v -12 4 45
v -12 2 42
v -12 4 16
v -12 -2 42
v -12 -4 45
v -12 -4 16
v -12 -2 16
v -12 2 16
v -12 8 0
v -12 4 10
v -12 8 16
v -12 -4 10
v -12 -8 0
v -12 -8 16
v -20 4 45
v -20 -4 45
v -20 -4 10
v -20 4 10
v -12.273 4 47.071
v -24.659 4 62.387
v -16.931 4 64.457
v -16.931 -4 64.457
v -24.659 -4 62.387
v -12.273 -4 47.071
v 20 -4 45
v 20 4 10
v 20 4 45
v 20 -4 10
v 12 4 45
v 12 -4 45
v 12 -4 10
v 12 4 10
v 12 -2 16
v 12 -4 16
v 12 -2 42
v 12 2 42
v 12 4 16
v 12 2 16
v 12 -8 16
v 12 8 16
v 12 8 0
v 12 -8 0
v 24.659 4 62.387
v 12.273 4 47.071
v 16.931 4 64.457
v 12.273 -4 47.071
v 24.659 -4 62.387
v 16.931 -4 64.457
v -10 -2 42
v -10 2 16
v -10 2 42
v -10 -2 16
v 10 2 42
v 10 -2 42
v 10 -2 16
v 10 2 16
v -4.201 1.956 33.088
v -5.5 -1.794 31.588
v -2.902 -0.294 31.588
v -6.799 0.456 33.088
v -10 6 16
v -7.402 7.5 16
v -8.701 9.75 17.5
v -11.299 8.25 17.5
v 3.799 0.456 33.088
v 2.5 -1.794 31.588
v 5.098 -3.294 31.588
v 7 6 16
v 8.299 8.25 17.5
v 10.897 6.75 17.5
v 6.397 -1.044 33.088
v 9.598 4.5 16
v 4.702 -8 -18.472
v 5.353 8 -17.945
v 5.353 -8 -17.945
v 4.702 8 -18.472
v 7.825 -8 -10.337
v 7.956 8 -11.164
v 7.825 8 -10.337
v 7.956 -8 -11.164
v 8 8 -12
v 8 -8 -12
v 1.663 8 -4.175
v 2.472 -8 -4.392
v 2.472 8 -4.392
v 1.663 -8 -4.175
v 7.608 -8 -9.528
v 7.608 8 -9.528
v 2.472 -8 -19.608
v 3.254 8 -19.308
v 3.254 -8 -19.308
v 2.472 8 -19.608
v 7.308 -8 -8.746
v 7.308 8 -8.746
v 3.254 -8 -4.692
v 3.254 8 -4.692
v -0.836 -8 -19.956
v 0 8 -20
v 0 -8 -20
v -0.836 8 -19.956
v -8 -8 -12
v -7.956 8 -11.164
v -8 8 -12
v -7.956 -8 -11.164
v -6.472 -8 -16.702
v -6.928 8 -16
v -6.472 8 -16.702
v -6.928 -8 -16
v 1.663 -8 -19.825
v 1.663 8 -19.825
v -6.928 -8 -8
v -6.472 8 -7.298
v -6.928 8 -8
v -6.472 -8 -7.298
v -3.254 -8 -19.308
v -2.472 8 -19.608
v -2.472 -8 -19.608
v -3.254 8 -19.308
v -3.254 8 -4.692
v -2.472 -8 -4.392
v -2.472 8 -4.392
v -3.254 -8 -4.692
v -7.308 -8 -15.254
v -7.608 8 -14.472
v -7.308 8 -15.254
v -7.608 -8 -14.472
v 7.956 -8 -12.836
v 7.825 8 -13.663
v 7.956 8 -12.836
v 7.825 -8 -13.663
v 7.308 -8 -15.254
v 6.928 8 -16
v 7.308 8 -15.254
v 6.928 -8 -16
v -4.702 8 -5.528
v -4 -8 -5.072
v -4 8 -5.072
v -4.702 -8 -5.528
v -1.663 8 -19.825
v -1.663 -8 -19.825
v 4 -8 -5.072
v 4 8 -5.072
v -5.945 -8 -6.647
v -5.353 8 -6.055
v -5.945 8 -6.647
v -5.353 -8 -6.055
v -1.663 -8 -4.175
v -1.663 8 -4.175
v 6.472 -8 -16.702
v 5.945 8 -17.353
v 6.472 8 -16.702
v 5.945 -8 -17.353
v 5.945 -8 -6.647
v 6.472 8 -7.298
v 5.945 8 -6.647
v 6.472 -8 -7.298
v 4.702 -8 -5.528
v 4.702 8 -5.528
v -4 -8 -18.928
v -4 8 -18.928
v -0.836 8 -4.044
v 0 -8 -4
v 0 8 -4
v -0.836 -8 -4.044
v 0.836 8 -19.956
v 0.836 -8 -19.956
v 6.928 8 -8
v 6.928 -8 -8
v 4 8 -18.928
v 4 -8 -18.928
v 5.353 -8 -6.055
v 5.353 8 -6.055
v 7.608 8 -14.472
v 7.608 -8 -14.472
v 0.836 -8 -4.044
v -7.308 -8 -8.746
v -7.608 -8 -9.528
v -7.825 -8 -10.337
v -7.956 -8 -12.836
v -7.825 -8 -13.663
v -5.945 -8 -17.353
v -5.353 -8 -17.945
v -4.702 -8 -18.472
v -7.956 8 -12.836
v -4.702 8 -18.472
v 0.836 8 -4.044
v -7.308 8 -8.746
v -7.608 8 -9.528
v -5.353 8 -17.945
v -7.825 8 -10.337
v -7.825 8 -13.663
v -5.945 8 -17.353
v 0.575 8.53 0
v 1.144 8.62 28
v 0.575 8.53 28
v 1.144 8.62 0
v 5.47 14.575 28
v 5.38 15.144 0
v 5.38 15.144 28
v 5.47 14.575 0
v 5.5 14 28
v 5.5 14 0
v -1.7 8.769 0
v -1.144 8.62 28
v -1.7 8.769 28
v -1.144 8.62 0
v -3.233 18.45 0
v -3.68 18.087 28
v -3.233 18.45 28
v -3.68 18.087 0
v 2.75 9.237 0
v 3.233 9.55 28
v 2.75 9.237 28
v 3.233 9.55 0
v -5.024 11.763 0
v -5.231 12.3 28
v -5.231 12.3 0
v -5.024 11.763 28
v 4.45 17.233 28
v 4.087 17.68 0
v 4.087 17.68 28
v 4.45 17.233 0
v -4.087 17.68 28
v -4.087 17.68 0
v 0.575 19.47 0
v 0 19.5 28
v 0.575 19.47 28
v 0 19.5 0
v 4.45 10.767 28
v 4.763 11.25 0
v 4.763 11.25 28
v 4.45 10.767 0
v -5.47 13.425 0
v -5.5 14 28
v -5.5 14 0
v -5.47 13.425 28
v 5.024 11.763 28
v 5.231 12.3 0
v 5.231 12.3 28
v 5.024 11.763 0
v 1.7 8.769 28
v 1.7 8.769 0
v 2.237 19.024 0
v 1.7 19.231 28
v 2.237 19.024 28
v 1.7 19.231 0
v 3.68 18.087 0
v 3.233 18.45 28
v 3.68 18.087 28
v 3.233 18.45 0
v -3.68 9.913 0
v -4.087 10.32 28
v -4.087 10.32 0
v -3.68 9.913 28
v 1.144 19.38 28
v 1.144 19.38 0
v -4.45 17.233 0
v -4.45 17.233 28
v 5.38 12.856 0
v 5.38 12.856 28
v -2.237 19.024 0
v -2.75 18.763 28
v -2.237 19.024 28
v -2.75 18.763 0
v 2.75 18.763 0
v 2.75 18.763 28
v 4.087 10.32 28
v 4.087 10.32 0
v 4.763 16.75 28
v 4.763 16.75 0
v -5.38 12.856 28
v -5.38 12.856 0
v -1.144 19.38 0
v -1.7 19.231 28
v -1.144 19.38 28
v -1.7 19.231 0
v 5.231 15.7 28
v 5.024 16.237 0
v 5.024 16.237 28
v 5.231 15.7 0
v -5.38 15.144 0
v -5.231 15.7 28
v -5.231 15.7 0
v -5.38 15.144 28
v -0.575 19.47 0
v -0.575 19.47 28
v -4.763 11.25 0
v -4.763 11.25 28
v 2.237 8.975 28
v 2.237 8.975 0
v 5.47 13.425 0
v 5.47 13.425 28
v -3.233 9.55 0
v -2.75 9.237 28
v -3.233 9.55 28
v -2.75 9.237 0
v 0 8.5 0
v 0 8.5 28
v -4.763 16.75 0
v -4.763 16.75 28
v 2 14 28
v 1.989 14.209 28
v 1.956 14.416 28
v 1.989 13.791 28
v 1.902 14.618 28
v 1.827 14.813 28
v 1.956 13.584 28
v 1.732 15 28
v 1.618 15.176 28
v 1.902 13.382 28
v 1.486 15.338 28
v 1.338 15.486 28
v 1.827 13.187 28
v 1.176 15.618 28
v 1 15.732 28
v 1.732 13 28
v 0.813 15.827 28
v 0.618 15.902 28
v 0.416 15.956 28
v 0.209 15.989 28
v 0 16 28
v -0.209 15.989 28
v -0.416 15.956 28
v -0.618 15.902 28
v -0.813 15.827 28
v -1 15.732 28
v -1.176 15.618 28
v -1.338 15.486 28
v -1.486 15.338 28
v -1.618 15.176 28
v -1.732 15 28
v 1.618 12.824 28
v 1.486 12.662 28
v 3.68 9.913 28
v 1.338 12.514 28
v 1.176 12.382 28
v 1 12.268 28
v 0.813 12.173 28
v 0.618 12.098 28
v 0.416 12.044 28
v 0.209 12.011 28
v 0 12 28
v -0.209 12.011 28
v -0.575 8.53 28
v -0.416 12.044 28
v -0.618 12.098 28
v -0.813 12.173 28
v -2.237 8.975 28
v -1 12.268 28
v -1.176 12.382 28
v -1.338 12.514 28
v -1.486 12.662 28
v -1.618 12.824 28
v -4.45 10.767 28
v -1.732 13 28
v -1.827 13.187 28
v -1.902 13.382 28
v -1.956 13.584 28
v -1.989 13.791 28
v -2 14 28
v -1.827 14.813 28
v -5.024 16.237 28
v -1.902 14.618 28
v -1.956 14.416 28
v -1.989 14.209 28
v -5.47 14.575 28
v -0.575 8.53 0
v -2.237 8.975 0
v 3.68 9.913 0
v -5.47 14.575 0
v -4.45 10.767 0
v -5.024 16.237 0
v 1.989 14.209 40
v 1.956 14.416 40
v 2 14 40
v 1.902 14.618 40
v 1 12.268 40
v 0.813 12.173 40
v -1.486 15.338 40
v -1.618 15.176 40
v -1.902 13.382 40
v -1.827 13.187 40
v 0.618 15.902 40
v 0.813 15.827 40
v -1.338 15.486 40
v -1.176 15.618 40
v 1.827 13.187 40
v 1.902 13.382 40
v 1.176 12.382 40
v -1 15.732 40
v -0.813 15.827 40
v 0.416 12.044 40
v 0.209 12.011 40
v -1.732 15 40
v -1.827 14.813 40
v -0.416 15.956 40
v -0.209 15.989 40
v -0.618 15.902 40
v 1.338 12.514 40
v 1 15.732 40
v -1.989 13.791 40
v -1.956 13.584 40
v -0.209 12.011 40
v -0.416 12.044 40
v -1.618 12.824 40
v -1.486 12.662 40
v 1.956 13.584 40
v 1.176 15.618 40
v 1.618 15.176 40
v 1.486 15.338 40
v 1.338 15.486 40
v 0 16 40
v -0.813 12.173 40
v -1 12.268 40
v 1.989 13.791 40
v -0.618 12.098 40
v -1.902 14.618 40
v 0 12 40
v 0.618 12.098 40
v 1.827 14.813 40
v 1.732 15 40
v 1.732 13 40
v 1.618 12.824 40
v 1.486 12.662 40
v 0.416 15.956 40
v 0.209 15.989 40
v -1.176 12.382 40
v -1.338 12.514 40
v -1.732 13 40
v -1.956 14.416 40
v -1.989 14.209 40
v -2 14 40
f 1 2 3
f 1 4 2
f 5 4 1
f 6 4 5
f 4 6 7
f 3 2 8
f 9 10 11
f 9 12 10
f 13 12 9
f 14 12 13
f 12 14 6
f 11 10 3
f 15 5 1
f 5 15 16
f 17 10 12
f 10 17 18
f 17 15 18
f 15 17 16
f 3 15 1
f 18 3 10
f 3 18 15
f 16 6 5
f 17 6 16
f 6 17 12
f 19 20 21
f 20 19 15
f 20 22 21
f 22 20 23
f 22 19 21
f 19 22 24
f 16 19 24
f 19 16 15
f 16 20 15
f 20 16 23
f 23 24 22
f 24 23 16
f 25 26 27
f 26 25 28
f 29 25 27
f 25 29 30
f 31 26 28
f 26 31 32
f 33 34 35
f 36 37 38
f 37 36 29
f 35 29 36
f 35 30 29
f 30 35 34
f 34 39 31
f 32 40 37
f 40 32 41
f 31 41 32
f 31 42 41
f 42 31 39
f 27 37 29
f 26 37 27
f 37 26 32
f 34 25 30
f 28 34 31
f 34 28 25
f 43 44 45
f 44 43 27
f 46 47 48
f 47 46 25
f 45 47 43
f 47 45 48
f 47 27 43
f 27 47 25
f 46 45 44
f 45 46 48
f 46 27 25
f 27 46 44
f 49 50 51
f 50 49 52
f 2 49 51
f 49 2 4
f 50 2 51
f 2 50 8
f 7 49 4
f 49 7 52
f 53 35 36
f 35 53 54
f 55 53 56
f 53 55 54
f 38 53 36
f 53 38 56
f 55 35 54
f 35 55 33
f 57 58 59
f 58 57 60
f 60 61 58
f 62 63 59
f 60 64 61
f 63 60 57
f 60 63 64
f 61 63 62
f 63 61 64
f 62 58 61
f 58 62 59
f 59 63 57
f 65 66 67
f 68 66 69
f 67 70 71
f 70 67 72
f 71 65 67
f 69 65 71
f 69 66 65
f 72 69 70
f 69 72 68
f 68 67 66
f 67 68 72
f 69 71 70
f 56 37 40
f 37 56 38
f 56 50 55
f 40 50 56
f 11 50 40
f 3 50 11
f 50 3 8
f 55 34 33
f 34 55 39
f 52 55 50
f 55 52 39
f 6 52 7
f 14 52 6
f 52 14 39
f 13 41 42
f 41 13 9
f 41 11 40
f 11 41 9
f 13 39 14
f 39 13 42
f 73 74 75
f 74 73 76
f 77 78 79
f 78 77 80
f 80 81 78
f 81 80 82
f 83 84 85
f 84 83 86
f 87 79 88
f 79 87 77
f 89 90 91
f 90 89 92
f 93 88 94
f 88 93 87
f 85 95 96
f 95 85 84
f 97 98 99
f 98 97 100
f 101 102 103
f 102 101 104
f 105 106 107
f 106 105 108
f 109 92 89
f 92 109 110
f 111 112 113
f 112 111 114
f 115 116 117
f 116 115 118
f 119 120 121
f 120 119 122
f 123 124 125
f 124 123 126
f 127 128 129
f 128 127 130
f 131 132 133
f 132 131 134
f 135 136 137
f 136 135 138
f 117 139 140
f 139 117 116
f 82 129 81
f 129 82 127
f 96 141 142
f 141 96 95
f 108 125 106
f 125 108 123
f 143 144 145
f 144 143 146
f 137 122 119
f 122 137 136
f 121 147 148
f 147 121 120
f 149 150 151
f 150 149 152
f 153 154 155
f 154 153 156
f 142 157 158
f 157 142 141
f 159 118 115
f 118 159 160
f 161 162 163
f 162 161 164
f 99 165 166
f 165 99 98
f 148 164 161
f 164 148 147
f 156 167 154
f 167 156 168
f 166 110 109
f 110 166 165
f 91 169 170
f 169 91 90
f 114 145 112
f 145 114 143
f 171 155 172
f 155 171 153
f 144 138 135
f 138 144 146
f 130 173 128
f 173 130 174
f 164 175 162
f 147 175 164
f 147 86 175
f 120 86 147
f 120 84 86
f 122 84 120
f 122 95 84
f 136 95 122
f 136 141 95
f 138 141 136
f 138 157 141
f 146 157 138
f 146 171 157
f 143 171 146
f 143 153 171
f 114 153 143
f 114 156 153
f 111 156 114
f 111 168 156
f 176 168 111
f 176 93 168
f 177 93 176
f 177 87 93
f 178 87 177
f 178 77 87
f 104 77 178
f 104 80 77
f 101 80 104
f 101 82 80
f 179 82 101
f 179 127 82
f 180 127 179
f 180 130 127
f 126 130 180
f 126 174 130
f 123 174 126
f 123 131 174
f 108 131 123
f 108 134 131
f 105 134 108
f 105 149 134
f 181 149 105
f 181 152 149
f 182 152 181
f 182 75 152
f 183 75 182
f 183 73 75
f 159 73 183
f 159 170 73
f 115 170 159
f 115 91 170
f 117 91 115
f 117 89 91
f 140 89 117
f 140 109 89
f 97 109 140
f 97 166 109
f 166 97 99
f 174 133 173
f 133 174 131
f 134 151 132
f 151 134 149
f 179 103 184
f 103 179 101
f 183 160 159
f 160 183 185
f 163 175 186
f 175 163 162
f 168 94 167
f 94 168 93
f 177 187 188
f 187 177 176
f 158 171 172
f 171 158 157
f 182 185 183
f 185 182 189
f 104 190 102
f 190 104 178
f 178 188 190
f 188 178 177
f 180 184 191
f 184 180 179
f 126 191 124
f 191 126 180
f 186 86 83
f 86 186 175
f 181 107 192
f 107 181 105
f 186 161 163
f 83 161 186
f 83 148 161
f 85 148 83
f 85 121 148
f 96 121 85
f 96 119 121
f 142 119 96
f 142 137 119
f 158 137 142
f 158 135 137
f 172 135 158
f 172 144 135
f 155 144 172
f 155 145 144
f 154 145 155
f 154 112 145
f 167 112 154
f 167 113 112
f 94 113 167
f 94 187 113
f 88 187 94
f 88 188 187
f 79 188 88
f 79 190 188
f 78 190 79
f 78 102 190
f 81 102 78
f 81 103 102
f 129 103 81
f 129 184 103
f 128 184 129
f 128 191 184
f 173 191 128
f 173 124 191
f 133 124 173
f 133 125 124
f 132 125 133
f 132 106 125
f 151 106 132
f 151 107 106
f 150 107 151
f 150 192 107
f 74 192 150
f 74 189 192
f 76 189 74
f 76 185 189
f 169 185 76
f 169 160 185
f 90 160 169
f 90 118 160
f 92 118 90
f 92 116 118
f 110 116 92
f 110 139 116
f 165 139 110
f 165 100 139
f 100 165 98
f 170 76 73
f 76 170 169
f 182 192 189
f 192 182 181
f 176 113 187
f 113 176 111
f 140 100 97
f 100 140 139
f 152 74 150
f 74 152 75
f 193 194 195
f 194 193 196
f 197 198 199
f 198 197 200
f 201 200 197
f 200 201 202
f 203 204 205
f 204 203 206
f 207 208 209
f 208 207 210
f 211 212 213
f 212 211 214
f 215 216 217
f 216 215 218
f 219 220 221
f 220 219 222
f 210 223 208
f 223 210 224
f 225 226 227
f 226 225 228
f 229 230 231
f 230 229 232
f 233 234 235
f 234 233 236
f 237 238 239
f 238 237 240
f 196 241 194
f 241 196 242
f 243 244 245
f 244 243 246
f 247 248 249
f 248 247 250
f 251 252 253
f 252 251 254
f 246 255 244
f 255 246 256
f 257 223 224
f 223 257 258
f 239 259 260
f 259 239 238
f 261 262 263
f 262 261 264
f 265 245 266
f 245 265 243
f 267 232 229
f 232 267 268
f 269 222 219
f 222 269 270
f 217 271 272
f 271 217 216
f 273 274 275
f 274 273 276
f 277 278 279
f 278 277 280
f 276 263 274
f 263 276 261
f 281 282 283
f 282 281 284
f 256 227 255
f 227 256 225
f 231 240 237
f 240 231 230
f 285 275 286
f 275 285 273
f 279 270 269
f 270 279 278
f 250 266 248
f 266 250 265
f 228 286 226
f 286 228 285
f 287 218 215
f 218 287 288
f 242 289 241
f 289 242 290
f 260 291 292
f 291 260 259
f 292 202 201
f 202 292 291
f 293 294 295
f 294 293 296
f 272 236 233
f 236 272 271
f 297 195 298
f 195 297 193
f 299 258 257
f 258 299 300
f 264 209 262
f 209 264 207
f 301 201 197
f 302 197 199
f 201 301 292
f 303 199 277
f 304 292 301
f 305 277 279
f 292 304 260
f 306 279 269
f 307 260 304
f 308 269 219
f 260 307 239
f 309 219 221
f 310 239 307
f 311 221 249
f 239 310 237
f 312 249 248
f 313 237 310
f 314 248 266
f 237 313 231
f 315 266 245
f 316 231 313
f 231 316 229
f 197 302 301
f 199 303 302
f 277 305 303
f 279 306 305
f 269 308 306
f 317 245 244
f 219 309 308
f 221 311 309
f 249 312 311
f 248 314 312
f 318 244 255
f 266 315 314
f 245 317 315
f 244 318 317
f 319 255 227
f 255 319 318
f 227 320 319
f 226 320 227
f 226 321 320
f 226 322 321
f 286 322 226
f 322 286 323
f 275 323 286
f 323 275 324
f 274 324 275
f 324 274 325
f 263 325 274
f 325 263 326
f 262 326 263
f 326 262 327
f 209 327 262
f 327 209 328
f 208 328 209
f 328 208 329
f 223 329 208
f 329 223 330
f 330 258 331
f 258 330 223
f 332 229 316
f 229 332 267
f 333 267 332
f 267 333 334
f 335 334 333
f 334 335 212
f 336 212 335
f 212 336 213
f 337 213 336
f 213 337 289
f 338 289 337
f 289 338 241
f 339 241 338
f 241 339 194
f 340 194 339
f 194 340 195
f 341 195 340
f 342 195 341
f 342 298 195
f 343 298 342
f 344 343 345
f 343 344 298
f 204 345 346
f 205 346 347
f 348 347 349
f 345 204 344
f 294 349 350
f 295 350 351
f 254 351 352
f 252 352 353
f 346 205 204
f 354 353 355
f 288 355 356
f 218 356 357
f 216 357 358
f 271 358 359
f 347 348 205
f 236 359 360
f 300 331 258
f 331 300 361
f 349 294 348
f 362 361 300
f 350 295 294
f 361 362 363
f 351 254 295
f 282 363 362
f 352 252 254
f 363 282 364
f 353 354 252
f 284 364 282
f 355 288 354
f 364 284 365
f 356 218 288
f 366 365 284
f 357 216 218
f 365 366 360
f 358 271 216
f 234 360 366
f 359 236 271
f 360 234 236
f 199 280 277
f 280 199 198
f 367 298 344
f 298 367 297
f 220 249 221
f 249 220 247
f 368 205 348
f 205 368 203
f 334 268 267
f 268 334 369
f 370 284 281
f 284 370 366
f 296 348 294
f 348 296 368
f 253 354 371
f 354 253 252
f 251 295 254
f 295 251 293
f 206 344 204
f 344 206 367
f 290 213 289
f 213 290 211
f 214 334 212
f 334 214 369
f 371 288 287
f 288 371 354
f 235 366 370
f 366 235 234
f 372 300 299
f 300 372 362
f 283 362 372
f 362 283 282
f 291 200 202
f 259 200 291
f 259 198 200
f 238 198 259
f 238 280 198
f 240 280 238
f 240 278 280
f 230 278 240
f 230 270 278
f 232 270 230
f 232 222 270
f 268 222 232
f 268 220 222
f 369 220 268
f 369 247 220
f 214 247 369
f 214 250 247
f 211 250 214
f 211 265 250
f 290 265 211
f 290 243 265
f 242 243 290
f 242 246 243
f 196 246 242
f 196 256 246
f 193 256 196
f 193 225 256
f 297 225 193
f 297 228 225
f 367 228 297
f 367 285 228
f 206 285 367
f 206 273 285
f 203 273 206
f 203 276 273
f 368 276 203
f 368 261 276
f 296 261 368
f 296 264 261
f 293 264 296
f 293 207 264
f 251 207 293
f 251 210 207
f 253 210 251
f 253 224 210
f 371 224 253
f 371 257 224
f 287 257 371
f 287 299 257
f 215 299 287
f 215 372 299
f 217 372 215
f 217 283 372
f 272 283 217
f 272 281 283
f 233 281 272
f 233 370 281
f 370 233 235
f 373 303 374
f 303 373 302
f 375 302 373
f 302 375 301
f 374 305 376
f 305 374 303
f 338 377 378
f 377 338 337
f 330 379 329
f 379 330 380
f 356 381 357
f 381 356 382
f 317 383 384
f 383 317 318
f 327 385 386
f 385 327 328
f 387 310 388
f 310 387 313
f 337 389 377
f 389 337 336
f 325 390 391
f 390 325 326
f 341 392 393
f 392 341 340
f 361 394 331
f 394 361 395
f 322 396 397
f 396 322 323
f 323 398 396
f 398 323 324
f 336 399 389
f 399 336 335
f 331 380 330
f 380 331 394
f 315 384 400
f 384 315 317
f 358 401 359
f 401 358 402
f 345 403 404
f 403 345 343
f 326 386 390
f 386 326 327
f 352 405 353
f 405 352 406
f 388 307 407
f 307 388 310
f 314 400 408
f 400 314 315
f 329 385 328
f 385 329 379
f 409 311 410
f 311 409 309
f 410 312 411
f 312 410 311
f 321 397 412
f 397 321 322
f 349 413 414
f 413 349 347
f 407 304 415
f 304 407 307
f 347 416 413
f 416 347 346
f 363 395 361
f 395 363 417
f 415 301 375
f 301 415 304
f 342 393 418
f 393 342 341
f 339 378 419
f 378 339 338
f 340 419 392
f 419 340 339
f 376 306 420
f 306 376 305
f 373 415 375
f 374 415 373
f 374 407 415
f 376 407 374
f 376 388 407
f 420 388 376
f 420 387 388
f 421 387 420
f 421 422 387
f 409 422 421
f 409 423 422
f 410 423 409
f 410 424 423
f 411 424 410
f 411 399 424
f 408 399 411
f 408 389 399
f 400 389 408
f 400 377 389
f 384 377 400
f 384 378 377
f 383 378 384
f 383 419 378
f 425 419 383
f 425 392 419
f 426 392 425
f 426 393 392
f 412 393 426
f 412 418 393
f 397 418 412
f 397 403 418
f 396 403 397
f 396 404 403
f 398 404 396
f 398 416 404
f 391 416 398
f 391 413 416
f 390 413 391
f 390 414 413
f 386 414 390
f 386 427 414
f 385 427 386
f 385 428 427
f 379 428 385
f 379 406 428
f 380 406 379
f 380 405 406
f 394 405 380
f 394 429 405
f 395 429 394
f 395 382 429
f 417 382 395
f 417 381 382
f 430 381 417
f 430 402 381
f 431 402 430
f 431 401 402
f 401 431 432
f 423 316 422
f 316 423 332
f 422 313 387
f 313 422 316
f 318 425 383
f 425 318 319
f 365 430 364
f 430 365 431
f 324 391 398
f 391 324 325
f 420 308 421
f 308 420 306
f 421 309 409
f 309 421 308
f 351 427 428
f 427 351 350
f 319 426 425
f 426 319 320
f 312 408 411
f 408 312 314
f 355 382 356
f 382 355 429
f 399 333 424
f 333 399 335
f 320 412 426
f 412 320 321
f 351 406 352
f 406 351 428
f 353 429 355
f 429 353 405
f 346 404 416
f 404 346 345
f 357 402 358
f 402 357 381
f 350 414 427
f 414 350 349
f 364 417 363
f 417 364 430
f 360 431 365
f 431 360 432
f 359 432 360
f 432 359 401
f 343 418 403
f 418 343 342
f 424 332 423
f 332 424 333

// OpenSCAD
// file: _common.scad
// mechanism 共用設定 + 齒輪 module
$fn = 60;

// 簡化齒輪：N 個齒、節圓半徑 r、齒高 h、齒寬 w
module simple_gear(N = 16, r = 20, h = 4, thick = 6) {
  union() {
    // 主圓盤
    cylinder(h = thick, r = r, center = true);
    // 齒（梯形）
    for (i = [0:N-1]) {
      rotate([0, 0, i * 360 / N])
        translate([r, 0, 0])
          linear_extrude(height = thick, center = true)
            polygon([[0, -2.4], [h, -1.4], [h, 1.4], [0, 2.4]]);
    }
    // 中心凸軸
    cylinder(h = thick * 1.4, r = r * 0.18, center = true);
  }
}
// main file
// 軸4：夾爪（兩指夾具）
include <_common.scad>

// 夾爪基座
color([0.40, 0.40, 0.43])
  translate([-12, -8, 0]) cube([24, 16, 16]);

// 腕關節圓柱
color([0.35, 0.35, 0.38])
  translate([0, 0, -12]) rotate([90, 0, 0]) cylinder(h = 16, r = 8, center = true);

// 左夾爪
color([0.50, 0.52, 0.55])
  translate([-20, -4, 10]) {
    cube([8, 8, 35]);
    // 爪尖（斜切）
    translate([0, 0, 35]) rotate([0, -15, 0]) cube([8, 8, 18]);
  }

// 右夾爪（對稱）
color([0.50, 0.52, 0.55])
  translate([12, -4, 10]) {
    cube([8, 8, 35]);
    translate([8, 0, 35]) rotate([0, 15, 0]) translate([-8, 0, 0]) cube([8, 8, 18]);
  }

// 夾爪內側橡膠墊（防滑）
color([0.15, 0.15, 0.15]) {
  translate([-12, -2, 12]) cube([2, 4, 30]);
  translate([10, -2, 12]) cube([2, 4, 30]);
}

// 針筒（夾爪控制）
color([0.70, 0.78, 0.85, 0.75])
  translate([0, 14, 0]) cylinder(h = 28, r = 5.5);
color([0.60, 0.60, 0.65])
  translate([0, 14, 28]) cylinder(h = 12, r = 2);

// 連桿（連接針筒和夾爪）
color([0.55, 0.56, 0.58]) {
  translate([-10, 6, 16]) rotate([30, 0, 30]) cube([3, 3, 18]);
  translate([7, 6, 16]) rotate([30, 0, -30]) cube([3, 3, 18]);
}
